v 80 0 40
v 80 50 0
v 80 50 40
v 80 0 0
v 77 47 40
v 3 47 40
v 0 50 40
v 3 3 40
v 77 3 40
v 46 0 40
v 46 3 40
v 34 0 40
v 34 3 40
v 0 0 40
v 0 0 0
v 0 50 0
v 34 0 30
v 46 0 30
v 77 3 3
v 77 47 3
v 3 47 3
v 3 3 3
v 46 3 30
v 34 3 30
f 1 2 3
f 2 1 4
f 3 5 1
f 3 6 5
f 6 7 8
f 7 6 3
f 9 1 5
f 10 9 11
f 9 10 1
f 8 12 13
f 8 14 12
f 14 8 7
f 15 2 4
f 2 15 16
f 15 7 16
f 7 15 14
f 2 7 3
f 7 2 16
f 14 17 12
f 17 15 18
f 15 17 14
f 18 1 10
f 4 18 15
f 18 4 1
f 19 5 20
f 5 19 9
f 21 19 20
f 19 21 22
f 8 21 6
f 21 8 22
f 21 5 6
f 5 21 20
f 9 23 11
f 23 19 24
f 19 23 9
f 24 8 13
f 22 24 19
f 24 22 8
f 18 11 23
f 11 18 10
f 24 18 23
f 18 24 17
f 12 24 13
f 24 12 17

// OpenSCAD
$fn = 32;

// ----------------------------------------------------------------------
// Enclosure box: notch enclosure
// ----------------------------------------------------------------------

// --- parameters (mm) ---
box_l = 80;               // outer length, X
box_w = 50;               // outer width, Y
box_h = 40;               // outer height
wall_t = 3;               // wall thickness
notch_w = 12;             // cable notch width
notch_h = 10;             // cable notch height
fit_tol = 0.05;           // tolerance for press fits, mm
free_tol = 0.3;           // tolerance for clearance fits, mm

inner_h = box_h - wall_t;  // cavity depth
boss_h = inner_h - 2;  // corner boss height

difference() {
  union() {
    difference() {
      cube([box_l, box_w, box_h]);
      translate([wall_t, wall_t, wall_t])
        cube([box_l - 2 * wall_t, box_w - 2 * wall_t, box_h]);
    }
  }
  translate([box_l / 2 - notch_w / 2, -1, box_h - notch_h])
    cube([notch_w, wall_t + 2, notch_h + 1]);
}
